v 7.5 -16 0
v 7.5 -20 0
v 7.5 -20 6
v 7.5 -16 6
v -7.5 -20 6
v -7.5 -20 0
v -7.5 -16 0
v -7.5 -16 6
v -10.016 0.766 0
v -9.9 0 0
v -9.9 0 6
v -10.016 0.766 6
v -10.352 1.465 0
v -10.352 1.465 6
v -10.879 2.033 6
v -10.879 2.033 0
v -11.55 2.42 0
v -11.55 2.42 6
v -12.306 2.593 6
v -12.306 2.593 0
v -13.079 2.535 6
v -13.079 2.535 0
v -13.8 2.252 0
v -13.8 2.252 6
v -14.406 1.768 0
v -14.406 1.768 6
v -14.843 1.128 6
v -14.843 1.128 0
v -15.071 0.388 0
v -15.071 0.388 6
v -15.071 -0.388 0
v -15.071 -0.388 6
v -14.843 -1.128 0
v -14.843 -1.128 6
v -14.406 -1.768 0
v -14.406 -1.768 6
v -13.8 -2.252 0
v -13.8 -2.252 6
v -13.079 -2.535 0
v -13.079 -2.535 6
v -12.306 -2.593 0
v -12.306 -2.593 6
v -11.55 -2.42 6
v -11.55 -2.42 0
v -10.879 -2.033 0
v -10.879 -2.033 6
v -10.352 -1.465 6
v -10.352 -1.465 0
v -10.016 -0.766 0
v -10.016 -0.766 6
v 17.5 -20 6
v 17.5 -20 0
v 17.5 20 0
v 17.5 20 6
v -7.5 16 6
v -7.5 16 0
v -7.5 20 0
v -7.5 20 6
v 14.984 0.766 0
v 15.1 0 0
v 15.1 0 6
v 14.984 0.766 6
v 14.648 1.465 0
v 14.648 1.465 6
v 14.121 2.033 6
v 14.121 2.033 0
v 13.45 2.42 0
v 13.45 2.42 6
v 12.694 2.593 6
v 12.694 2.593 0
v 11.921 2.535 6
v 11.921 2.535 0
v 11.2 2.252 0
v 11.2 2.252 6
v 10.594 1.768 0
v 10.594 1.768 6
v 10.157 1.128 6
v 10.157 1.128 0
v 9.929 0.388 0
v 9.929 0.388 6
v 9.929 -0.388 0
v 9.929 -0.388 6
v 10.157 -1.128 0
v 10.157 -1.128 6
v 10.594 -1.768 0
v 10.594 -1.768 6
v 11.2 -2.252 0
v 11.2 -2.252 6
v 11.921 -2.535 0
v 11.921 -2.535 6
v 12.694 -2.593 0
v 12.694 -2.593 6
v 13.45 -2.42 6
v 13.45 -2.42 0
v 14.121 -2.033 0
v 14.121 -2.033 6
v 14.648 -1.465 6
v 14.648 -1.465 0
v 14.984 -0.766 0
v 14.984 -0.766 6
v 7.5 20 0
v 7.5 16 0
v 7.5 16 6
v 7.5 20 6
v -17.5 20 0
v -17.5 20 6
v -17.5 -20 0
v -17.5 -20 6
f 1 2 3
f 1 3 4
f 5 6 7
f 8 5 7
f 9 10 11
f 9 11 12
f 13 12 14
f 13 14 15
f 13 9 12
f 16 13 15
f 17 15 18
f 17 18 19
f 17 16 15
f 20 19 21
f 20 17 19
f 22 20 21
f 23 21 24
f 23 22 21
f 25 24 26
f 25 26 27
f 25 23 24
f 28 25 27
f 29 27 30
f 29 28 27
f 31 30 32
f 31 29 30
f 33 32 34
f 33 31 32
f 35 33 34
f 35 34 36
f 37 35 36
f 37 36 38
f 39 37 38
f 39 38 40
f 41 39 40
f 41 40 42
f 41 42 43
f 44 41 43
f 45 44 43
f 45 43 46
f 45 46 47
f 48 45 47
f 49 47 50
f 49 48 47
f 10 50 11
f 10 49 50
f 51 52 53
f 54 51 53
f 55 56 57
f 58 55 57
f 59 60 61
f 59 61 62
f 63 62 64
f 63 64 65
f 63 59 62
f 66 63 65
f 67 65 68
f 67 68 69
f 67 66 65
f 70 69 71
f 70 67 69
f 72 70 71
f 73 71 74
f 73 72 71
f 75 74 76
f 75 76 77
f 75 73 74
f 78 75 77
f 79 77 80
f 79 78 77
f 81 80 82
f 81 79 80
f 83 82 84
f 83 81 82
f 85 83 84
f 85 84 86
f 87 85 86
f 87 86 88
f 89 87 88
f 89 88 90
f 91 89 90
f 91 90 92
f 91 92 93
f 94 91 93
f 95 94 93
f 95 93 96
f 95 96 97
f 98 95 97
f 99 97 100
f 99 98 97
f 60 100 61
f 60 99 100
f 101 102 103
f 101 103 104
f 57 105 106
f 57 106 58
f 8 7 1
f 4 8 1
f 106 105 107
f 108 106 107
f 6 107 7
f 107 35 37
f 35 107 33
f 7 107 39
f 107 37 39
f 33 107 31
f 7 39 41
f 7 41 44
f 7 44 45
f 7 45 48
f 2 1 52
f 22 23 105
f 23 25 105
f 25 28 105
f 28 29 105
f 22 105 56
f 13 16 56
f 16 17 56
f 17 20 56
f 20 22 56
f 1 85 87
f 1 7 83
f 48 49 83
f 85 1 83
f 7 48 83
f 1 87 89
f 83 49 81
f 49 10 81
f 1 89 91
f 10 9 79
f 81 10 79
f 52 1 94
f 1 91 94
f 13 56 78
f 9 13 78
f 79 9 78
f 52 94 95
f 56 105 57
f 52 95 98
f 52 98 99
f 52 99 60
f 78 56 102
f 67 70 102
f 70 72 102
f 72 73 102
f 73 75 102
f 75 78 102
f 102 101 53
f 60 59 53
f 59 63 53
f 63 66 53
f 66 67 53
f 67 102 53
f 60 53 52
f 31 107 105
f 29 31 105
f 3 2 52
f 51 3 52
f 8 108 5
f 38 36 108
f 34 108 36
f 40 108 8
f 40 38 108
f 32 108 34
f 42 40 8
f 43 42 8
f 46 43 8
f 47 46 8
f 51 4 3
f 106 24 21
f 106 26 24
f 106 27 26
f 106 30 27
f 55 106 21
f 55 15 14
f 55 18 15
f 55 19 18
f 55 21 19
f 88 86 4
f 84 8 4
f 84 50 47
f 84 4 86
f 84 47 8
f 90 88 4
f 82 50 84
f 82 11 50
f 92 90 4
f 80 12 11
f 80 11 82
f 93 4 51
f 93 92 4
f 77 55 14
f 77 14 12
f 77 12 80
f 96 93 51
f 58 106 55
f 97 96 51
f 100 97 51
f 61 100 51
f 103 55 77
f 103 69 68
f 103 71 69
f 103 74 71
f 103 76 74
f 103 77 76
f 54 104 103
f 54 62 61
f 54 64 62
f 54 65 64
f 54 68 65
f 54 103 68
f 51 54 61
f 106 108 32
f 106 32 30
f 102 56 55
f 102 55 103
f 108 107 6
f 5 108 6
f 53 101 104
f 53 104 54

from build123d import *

# Parameters (mm, degrees)
ESBO_O1_W                = 10
ESBO_O1_H                = 4
ESBO_O1_W_2              = 35
ESBO_O1_H_2              = 32
ESBO_O1_R                = 2.6
RESSALTO_EXTRUS_O1_DEPTH = 6


with BuildPart() as part:
    # Esboço1 → Ressalto-extrusão1 (new body)
    with BuildSketch(Plane.XY):
        with Locations((-12.5, -18)):
            Rectangle(ESBO_O1_W, ESBO_O1_H)
        Rectangle(ESBO_O1_W_2, ESBO_O1_H_2)
        with Locations((-12.5, 0)):
            Circle(ESBO_O1_R, mode=Mode.SUBTRACT)
        with Locations((12.5, 0)):
            Circle(ESBO_O1_R, mode=Mode.SUBTRACT)
        with Locations((12.5, -18)):
            Rectangle(ESBO_O1_W, ESBO_O1_H)
        with Locations((12.5, 18)):
            Rectangle(ESBO_O1_W, ESBO_O1_H)
        with Locations((-12.5, 18)):
            Rectangle(ESBO_O1_W, ESBO_O1_H)
    extrude(amount=RESSALTO_EXTRUS_O1_DEPTH)


solid = part.part
